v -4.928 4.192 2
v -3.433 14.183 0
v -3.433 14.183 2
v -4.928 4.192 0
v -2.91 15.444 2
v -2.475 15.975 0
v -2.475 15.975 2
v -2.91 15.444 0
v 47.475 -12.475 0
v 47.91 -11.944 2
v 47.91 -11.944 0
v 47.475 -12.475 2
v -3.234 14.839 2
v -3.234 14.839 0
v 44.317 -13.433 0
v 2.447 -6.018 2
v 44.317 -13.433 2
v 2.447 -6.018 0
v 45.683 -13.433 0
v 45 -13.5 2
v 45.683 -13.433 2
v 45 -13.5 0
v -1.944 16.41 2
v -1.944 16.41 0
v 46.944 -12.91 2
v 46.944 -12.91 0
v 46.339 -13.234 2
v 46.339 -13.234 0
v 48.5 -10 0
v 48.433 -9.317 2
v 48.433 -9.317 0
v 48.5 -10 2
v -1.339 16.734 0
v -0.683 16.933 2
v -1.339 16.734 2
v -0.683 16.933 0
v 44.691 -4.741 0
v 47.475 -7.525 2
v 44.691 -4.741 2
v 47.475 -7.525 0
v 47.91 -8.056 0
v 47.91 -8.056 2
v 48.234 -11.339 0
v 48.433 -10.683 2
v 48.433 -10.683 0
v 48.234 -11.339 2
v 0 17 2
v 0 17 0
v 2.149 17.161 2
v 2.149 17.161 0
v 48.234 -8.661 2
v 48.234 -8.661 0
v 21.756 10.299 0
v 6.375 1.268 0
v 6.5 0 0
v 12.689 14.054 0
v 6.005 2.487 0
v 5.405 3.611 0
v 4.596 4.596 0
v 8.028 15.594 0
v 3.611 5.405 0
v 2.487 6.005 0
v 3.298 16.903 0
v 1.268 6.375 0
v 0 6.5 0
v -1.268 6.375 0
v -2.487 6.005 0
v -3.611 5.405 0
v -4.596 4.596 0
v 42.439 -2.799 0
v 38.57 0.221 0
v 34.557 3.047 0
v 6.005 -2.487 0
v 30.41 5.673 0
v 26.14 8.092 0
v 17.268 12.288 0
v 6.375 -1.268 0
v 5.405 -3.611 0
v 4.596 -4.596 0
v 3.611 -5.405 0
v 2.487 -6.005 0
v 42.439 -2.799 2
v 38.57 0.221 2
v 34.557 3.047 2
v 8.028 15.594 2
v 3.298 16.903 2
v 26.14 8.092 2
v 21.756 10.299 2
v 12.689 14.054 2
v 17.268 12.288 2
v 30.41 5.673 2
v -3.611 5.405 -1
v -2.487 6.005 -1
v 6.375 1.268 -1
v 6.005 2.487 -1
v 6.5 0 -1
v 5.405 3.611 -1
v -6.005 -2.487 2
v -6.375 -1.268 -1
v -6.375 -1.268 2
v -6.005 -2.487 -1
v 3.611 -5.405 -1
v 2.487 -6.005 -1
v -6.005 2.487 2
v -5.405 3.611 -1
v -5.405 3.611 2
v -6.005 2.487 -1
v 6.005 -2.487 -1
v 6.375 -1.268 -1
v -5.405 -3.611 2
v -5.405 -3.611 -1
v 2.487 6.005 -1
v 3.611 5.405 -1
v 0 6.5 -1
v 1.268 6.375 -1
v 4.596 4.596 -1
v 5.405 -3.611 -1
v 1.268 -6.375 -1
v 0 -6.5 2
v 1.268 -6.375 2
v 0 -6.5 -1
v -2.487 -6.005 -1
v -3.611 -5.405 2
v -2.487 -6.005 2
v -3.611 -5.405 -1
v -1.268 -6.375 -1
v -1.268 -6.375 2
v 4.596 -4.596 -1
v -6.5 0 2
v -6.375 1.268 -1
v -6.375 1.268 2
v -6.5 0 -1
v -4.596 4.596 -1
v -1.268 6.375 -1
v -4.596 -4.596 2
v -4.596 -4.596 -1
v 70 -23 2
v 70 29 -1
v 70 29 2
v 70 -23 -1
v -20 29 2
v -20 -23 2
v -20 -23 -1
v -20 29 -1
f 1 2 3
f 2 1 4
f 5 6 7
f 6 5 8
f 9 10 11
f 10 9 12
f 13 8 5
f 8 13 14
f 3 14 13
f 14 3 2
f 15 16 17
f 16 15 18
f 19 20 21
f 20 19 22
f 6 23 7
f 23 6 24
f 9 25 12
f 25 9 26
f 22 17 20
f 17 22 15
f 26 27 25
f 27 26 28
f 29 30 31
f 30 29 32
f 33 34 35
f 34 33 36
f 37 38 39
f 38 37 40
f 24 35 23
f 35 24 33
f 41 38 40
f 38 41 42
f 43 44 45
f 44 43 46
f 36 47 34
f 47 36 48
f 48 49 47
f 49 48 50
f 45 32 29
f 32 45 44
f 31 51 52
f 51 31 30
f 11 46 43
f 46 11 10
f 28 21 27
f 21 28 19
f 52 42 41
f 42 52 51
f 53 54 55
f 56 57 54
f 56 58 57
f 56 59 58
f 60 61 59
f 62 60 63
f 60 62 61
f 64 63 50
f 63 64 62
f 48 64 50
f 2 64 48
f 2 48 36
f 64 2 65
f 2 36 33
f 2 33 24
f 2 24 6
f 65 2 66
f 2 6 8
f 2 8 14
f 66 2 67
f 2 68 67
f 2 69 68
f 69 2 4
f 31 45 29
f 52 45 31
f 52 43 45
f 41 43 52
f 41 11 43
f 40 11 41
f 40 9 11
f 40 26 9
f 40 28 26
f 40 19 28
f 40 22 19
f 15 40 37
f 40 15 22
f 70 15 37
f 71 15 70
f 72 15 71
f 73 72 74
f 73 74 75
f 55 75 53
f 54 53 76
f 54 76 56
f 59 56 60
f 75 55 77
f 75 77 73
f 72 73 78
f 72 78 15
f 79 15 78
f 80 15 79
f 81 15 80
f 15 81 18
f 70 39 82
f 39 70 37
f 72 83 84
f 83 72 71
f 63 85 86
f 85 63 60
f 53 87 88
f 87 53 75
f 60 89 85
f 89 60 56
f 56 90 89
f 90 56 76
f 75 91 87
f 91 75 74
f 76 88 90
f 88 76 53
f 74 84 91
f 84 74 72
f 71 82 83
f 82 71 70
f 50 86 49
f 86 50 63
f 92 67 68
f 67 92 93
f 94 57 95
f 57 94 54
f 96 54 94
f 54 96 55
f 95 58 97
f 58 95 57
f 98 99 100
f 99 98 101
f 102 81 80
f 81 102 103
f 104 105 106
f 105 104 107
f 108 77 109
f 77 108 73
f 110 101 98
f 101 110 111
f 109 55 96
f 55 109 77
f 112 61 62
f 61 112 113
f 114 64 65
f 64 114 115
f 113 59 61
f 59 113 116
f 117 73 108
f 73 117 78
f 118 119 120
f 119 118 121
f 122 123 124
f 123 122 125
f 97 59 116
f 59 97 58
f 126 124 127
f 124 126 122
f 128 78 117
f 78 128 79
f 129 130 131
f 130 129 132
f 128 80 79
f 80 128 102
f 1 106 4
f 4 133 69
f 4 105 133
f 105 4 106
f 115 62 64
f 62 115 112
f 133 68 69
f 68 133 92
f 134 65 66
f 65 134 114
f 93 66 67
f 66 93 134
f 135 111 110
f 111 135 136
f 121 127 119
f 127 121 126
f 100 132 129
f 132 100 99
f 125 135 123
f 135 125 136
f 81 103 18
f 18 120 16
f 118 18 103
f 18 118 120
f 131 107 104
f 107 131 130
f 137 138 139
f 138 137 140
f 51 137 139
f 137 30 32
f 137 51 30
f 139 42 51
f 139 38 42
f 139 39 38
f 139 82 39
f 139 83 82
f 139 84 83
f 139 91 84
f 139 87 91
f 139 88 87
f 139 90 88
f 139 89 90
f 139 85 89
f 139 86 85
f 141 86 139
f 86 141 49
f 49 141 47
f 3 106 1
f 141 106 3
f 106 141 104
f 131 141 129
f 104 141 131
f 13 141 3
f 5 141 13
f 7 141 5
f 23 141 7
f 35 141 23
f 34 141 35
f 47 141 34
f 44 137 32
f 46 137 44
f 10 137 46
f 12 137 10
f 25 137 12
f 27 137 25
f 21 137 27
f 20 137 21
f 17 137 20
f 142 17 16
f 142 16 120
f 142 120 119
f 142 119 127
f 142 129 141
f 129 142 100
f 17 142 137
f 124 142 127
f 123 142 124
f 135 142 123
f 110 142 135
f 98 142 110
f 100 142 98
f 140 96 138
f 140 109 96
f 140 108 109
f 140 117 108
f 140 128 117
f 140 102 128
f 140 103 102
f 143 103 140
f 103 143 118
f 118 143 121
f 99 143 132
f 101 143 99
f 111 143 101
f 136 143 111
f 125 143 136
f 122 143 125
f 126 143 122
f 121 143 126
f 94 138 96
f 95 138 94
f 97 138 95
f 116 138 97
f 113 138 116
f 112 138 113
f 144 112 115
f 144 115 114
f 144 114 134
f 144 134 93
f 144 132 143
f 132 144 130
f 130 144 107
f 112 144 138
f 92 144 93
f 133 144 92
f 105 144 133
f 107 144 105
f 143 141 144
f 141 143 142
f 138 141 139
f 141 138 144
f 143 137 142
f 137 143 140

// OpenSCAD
$fn = 32;
/* linear_extrude(height = 10, center = true, convexity = 10) */
/*    import (file = "wings.svg"); */


thickness = 5;
formt = 3;
render()
difference() {
  translate([-20, -23, -1]) {
    cube([90, 52, formt]);
  }
  #union() {
    translate([0, 0, -3]) {
      cylinder(h=8, r=6.5);
    }
    intersection() {
      hull() {
        cylinder(h=thickness, r=5.5);
        translate([0, 13.5, 0]) {
          cylinder(h=thickness, r=3.5);
        }
        translate([45, -10, 0]) {
          cylinder(h=thickness, r=3.5);
        }
        translate([20, 15, 0]) {
          cylinder(h=thickness, r=3.5);
        } /* translate([25, 10, 0]) { */
        /*   cylinder(h=thickness, r=3.5); */
        /* } */
        /* translate([40, 4, 0]) { */
        /*   cylinder(h=thickness, r=3.5); */
        /* } */
      }
      translate([-21.0, -80.1, 0]) {
        cylinder(h=thickness, r=100, $fn=128);
      }
    }
  }
}
